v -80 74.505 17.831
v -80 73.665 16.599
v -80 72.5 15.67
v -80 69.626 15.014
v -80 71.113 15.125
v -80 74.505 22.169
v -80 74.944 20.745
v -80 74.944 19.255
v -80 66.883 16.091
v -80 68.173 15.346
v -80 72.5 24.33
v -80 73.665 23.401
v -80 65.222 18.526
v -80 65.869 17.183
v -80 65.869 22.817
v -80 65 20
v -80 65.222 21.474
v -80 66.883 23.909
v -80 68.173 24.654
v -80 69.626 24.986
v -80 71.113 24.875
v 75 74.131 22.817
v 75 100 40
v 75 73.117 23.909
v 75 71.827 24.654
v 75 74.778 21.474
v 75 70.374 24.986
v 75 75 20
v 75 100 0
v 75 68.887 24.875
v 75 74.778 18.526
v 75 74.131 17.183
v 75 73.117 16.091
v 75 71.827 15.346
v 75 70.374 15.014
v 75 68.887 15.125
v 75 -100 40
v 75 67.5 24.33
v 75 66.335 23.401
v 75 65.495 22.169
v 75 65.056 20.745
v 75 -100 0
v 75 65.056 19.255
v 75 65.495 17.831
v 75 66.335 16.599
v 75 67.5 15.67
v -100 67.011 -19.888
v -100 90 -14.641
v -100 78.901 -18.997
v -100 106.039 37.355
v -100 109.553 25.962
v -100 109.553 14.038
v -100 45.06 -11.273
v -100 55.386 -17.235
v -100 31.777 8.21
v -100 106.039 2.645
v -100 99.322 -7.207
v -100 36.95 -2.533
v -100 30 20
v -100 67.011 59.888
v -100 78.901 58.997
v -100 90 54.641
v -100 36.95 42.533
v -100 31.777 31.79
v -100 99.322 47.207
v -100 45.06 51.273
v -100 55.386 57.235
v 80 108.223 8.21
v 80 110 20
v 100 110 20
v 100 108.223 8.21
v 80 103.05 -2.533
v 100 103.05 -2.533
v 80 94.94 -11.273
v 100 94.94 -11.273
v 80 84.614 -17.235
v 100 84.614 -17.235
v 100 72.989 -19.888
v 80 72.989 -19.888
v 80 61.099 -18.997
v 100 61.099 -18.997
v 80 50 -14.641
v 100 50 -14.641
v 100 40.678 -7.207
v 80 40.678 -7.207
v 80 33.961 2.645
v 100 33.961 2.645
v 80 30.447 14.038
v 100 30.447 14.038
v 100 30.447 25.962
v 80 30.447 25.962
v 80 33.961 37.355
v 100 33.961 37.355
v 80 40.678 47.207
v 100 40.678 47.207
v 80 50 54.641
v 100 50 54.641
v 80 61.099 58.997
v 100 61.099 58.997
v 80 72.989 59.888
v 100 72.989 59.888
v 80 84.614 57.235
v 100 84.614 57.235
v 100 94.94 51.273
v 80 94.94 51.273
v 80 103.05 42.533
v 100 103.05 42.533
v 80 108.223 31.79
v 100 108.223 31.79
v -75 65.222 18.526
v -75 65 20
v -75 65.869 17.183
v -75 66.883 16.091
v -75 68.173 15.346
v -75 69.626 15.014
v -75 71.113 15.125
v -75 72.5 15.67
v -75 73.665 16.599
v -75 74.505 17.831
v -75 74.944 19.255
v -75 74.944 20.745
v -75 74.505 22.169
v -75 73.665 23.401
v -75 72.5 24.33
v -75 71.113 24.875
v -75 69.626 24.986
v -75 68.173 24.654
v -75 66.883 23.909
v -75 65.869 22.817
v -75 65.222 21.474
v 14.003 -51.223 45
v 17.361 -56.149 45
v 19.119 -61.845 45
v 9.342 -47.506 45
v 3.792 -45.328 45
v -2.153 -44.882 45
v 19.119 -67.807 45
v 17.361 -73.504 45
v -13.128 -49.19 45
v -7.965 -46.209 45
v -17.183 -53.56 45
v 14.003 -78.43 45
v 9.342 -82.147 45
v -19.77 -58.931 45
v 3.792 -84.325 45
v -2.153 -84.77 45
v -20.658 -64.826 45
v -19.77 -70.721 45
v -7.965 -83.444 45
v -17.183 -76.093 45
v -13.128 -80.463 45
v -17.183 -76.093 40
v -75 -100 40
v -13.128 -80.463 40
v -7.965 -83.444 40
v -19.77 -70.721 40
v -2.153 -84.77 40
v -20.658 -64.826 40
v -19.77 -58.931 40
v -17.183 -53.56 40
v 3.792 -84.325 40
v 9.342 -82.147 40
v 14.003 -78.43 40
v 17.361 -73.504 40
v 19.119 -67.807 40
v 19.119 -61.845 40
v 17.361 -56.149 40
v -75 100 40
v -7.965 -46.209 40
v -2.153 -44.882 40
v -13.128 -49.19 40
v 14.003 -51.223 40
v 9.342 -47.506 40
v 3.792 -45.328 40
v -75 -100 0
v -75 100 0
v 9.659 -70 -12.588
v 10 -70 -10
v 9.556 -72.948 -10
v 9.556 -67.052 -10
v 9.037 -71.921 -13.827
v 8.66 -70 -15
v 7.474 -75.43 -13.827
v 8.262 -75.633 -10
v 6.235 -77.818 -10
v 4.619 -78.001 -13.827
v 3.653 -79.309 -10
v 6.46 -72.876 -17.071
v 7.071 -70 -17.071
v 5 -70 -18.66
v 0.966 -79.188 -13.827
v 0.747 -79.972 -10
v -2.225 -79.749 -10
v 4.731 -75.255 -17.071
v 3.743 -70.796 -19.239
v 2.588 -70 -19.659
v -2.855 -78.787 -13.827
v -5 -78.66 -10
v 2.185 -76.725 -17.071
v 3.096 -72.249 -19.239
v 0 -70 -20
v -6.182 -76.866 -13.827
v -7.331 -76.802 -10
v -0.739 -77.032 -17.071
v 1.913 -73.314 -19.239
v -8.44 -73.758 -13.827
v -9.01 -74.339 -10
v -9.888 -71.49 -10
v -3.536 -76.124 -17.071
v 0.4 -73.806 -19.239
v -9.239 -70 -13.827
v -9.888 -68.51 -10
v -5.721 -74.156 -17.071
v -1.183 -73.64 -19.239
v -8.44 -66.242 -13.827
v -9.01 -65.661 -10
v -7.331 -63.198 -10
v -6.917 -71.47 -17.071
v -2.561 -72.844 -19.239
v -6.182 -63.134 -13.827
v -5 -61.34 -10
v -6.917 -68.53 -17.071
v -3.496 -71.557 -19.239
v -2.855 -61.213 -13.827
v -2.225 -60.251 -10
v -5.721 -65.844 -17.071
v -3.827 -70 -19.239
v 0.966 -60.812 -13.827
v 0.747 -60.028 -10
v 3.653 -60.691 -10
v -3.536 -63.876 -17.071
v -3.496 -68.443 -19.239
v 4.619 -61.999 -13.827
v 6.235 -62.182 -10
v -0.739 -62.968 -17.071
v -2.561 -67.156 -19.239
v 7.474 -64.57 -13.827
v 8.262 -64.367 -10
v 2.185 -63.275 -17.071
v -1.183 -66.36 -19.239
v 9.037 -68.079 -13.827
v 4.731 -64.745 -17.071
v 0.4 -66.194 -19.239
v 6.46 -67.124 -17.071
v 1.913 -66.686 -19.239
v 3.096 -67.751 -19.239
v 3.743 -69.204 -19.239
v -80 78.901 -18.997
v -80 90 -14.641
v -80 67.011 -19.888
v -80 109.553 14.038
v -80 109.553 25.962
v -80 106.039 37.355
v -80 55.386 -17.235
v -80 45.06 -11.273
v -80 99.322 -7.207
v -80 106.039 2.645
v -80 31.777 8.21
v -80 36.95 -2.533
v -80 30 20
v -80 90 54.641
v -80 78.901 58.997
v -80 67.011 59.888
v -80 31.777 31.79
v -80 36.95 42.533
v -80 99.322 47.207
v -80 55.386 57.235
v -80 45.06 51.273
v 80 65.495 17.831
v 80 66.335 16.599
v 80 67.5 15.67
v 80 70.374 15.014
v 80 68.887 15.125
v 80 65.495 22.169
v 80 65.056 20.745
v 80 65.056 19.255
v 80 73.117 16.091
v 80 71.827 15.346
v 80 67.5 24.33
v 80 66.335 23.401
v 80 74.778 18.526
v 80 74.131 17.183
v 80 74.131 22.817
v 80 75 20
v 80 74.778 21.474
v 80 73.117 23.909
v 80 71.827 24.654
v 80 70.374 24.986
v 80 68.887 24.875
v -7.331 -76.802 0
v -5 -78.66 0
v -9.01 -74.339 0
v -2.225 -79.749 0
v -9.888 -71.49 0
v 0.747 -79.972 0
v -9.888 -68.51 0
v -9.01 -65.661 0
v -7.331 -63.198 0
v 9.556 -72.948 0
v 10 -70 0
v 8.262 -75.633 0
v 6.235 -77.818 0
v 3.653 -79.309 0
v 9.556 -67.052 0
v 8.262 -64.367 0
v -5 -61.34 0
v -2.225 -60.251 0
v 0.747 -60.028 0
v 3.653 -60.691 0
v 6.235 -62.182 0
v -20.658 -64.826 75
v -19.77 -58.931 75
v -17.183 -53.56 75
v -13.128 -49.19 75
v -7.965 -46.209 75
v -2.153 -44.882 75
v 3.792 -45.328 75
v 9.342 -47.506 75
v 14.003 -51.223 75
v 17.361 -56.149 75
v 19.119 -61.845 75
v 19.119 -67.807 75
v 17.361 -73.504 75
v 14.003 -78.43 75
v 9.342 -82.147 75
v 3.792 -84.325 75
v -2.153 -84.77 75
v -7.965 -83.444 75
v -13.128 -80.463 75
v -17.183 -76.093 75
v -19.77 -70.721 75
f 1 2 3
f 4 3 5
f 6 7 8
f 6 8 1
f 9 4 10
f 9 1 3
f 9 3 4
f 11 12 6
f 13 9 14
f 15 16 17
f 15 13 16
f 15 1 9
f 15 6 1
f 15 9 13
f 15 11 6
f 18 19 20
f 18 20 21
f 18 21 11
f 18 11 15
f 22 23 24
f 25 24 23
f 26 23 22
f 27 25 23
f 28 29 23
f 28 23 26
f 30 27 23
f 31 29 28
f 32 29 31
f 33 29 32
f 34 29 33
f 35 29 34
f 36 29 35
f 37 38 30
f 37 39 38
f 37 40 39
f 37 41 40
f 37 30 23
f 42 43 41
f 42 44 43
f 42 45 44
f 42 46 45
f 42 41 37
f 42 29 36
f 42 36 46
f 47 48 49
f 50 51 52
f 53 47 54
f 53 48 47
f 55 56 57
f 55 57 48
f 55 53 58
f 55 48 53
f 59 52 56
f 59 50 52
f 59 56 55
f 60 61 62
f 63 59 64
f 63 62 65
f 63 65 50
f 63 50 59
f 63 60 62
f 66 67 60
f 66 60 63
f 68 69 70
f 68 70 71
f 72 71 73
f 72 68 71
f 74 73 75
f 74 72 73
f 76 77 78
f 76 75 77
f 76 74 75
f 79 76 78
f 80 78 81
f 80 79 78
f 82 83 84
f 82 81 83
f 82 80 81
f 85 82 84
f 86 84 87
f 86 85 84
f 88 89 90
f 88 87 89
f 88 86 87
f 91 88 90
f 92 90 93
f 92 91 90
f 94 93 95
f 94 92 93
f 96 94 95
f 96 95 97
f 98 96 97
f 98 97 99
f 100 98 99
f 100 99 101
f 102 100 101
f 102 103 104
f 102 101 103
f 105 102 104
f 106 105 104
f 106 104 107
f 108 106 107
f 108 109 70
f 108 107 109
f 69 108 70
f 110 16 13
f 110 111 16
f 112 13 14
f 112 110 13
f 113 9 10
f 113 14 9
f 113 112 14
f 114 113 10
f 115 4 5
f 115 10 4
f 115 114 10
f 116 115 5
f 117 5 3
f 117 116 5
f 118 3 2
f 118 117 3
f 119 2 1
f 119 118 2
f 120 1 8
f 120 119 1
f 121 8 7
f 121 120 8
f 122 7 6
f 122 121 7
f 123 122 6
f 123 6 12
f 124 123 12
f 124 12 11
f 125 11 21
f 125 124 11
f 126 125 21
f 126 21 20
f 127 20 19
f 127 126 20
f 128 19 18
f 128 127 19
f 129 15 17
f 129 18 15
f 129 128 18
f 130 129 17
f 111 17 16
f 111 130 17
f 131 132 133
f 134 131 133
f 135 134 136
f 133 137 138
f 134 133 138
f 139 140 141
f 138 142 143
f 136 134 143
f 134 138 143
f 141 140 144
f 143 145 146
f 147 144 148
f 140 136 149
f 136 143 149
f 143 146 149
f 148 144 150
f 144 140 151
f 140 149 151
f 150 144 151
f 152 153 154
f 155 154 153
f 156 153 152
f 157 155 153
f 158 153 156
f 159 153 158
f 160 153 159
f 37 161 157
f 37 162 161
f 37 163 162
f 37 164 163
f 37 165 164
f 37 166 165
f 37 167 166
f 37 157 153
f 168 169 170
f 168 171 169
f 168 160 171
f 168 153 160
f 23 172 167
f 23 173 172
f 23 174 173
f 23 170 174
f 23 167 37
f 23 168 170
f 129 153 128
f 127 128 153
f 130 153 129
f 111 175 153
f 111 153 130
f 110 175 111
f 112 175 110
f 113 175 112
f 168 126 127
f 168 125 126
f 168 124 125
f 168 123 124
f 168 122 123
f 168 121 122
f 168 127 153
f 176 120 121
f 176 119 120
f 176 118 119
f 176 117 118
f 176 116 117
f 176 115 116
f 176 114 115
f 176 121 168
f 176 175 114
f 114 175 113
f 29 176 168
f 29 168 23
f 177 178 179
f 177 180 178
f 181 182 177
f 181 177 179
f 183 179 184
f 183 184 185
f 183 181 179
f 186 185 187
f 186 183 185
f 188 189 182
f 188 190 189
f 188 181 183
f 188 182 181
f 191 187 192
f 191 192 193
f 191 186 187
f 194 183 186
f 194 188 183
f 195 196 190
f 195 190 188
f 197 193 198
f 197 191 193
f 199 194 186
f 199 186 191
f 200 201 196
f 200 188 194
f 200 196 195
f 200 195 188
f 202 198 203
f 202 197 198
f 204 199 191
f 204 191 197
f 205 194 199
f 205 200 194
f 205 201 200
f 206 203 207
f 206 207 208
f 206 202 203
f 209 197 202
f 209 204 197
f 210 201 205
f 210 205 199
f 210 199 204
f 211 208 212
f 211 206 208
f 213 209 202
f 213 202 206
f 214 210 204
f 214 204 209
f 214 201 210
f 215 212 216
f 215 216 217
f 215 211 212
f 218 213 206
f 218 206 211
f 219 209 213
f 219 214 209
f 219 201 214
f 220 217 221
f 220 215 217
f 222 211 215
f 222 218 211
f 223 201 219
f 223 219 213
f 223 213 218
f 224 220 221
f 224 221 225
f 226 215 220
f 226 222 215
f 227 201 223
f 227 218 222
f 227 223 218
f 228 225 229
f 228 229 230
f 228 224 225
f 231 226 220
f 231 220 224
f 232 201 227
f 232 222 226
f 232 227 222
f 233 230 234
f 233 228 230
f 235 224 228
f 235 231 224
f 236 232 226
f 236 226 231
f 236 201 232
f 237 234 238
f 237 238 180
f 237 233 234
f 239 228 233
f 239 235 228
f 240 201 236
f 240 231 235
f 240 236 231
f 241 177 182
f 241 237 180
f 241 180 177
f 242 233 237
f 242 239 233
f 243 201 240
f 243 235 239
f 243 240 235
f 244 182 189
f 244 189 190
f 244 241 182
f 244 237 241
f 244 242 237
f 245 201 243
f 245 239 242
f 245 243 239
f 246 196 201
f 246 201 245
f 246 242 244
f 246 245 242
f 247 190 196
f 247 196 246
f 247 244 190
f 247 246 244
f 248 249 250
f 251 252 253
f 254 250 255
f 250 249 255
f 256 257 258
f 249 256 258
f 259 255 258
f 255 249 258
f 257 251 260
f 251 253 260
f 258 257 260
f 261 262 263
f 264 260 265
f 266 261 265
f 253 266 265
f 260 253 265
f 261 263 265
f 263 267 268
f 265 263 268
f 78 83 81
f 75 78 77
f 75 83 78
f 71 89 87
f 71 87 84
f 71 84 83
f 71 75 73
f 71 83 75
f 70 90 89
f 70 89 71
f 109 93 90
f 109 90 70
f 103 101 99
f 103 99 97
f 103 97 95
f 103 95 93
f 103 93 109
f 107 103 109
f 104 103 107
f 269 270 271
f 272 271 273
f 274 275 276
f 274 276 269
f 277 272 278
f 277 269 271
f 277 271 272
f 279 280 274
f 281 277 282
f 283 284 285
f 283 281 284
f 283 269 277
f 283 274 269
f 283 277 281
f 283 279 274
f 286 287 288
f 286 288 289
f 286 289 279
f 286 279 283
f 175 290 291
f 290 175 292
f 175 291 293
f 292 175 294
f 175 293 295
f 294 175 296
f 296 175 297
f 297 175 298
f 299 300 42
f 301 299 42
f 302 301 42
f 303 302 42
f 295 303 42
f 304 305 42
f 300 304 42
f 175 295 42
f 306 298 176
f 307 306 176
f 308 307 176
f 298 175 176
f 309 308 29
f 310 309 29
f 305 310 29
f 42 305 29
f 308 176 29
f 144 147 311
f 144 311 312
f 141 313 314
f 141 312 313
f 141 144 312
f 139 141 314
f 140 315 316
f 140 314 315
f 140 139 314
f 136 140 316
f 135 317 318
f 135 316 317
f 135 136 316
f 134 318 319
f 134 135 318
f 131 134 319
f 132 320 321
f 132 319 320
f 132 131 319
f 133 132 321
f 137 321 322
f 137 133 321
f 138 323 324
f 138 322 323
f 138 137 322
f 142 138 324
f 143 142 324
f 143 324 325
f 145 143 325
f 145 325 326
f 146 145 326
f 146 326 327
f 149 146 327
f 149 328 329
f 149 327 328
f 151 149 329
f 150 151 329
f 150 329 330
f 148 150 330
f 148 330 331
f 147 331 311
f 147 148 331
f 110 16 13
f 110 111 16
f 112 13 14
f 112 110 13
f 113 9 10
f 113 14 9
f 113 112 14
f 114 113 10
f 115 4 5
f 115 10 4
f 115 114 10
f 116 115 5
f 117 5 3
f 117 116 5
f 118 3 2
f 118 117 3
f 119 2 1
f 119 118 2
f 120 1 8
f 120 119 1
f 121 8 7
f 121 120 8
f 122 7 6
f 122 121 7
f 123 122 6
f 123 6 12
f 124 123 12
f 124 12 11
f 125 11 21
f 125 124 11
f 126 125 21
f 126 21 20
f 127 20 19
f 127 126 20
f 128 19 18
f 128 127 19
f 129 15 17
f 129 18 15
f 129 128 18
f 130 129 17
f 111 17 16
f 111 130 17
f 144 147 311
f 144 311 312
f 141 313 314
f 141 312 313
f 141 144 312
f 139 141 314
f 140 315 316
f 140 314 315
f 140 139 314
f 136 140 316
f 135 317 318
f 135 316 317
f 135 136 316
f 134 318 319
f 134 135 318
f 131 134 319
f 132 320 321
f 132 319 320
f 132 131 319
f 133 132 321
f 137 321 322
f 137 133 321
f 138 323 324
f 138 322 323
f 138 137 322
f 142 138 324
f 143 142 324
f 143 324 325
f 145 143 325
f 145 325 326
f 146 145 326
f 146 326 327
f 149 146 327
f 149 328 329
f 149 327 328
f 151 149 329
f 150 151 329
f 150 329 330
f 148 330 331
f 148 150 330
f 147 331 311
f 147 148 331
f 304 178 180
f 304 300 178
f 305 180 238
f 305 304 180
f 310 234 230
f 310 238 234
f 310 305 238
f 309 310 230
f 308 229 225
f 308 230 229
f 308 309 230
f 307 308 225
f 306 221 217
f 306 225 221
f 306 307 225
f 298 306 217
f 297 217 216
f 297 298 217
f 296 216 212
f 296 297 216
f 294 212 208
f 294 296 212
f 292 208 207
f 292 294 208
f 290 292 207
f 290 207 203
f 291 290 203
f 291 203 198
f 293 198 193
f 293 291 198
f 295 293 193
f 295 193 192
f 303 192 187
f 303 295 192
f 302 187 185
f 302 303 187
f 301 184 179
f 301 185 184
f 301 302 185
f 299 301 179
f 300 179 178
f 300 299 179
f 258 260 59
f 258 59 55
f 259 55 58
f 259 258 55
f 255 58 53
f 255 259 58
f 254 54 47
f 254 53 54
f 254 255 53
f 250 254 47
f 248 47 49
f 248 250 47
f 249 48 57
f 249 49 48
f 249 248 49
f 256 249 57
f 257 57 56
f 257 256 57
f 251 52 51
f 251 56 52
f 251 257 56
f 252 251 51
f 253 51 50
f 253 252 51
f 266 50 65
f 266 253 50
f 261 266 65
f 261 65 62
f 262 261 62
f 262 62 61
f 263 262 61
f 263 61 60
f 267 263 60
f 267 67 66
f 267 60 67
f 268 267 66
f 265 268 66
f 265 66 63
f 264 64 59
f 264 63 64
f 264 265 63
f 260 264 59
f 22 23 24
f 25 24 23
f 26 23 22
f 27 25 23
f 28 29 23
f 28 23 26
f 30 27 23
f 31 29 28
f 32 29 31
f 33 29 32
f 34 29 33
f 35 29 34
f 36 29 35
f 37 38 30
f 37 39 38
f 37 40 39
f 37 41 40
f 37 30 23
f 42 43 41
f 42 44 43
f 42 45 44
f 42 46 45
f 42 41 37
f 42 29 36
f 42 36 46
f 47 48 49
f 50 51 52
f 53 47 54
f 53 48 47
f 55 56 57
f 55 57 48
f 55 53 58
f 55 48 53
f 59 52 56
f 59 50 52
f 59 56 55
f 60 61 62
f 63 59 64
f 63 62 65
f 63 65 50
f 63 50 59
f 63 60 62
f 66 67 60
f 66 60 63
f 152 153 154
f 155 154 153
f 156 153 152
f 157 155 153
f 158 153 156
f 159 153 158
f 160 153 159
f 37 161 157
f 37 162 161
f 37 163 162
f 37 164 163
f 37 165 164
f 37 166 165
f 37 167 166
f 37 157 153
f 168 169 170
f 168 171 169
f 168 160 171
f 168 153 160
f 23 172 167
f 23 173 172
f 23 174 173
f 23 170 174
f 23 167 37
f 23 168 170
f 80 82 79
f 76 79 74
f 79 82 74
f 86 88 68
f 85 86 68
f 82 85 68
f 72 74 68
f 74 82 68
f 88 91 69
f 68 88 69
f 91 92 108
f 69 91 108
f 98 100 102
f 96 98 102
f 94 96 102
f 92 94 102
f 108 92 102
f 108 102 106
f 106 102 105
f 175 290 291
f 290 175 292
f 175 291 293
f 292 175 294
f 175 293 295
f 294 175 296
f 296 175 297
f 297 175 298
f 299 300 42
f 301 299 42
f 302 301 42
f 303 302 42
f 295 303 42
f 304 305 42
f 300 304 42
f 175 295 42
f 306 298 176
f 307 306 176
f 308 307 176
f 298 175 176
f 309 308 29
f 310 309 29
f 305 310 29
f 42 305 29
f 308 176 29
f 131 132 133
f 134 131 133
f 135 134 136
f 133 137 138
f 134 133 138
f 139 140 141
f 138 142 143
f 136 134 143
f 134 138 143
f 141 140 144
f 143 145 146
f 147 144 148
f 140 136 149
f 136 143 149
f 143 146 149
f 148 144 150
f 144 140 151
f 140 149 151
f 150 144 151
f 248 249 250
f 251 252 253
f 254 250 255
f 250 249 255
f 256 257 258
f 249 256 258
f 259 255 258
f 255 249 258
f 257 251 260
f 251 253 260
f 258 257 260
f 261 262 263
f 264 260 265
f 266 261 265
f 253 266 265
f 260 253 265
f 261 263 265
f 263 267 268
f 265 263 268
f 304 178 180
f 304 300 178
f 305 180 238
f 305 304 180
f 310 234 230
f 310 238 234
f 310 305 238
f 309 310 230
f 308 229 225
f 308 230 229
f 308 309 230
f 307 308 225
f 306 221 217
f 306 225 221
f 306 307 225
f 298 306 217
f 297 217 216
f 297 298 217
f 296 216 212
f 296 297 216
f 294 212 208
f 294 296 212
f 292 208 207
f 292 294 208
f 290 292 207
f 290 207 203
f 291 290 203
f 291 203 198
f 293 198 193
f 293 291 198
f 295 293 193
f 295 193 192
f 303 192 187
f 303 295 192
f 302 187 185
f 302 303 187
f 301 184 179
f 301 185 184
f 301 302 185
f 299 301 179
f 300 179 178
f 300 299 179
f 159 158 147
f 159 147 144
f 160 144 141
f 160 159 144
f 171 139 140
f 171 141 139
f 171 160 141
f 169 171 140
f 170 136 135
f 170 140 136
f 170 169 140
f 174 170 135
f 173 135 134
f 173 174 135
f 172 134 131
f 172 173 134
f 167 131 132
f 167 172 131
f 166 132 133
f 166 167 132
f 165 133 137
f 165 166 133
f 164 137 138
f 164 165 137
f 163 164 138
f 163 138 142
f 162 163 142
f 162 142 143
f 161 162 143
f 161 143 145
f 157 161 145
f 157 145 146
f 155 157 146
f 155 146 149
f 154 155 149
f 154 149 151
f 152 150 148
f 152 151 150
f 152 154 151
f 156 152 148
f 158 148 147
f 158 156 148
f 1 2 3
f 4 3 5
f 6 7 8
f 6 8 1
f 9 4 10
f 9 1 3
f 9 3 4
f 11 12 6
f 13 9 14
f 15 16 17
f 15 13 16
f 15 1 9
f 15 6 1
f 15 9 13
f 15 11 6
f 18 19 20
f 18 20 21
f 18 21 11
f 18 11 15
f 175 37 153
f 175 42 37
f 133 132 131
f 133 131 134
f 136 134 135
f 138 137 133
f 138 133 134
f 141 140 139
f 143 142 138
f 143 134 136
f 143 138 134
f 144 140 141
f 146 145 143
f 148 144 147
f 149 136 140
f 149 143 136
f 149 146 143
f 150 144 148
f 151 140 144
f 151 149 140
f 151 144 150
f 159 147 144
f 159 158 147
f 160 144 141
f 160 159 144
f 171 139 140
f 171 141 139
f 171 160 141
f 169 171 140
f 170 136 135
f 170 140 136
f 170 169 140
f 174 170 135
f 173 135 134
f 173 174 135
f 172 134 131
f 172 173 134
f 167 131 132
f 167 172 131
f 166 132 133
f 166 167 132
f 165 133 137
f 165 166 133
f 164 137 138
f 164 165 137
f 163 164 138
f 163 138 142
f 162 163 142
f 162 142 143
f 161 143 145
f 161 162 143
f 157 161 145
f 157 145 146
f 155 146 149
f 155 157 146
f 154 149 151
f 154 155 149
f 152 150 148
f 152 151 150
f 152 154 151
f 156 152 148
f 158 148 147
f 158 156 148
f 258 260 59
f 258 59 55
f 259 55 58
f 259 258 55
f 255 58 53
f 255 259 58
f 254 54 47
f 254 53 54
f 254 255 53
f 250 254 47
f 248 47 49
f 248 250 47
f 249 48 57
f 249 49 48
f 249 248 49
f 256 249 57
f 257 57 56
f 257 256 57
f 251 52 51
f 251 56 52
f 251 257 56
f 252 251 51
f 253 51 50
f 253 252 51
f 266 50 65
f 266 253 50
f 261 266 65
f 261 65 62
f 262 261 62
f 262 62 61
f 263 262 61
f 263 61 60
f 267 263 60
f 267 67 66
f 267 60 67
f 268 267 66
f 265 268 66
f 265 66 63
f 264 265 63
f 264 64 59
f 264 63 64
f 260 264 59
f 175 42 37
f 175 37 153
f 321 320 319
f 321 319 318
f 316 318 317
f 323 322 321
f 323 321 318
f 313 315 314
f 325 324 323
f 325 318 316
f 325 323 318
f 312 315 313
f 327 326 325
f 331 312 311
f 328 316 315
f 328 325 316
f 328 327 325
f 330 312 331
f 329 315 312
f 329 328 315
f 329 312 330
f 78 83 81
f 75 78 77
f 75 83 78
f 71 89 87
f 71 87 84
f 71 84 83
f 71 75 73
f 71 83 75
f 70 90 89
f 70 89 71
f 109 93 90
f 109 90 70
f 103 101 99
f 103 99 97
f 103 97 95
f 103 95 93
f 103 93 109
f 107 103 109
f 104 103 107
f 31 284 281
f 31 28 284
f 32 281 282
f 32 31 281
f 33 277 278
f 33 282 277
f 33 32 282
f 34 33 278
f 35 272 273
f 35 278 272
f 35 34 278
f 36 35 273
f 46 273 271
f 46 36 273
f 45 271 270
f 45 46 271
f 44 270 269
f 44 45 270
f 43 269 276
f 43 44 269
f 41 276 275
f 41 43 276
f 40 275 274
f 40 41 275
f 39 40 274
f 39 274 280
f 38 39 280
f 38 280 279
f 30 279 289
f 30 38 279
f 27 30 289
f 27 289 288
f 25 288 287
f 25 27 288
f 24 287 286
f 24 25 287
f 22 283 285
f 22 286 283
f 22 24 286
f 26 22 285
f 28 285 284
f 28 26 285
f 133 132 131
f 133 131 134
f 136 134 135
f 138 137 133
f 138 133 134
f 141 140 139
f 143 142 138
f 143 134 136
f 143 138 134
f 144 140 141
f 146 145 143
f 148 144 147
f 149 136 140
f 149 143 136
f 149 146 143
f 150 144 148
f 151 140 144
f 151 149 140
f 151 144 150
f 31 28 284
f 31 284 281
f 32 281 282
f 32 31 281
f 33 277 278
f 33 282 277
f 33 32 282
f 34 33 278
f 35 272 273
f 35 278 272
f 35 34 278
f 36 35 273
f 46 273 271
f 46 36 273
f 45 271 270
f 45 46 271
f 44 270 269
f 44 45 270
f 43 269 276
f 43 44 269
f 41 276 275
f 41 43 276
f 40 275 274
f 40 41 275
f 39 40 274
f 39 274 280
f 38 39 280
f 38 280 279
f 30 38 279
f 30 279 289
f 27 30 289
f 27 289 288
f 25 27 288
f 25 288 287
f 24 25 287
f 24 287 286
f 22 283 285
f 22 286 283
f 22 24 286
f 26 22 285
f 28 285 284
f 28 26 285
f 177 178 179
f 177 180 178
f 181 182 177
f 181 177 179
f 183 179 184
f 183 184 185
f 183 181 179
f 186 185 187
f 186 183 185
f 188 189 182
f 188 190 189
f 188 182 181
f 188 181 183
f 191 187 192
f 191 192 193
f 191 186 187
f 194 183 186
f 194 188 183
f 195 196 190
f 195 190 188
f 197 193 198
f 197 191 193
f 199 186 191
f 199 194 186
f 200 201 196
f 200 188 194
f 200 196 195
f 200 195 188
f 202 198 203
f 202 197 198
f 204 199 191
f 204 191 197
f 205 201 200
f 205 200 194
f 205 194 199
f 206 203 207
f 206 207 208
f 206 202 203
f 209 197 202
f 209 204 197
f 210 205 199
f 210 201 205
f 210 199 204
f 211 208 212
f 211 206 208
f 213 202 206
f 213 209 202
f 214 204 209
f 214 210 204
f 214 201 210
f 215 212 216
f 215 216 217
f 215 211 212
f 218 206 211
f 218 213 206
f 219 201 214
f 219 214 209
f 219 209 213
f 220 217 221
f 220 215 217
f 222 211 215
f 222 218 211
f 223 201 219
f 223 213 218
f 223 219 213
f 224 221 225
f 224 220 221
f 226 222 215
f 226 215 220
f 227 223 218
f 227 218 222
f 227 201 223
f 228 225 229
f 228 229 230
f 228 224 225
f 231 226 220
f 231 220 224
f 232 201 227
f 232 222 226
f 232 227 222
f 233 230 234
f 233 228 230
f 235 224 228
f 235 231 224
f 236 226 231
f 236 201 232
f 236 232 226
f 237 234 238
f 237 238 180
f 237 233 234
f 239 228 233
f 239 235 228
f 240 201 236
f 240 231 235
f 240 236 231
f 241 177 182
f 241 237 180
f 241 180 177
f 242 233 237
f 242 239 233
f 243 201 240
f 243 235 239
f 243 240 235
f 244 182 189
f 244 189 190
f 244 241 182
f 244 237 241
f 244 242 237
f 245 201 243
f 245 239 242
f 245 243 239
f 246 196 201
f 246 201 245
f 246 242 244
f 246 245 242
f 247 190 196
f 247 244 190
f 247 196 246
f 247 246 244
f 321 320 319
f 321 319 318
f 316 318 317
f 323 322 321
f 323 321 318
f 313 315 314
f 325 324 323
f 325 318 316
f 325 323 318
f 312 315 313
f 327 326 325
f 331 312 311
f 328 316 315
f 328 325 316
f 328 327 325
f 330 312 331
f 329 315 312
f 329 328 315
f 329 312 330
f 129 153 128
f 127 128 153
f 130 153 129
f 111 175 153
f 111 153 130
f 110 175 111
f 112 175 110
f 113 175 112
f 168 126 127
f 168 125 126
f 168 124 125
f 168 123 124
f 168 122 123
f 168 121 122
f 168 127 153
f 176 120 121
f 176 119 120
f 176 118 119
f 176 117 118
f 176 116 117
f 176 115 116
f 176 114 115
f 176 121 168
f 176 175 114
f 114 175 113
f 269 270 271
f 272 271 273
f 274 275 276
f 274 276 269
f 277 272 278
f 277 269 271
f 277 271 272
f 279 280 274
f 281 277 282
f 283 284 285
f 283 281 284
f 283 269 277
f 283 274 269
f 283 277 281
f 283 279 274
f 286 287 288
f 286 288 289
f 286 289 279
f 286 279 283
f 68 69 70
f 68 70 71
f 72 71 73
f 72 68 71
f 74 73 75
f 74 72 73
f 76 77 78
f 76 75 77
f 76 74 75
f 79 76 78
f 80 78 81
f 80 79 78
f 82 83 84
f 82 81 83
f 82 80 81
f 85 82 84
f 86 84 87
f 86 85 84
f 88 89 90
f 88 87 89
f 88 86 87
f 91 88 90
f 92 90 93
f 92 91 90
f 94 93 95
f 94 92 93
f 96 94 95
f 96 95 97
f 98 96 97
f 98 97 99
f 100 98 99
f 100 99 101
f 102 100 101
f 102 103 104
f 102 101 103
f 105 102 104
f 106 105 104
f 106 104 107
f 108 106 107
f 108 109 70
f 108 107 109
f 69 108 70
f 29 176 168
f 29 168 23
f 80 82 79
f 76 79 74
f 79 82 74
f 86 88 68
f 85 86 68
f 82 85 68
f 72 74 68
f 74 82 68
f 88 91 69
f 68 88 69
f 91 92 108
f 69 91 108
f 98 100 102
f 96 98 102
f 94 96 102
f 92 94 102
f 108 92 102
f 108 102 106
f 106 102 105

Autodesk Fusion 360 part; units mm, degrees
sketch "Sketch1" plane through (0, 0, 0) normal (0, 0, 1) x (1, 0, 0)
  line L0 (75, -100) -> (-75, -100)
  line L1 (-75, -100) -> (-75, 100)
  line L2 (-75, 100) -> (75, 100)
  line L3 (75, 100) -> (75, -100)
  line L4 (75, -100) -> (-75, 100) construction
  line L5 (-75, -100) -> (75, 100) construction
  dimension "d1" = 200
  dimension "d2" = 150
extrude "Extrude1" add sketch "Sketch1" along normal blind 40 makes body 1
sketch "Sketch2" plane through (75, 0, 0) normal (1, 0, 0) x (0, 1, 0)
  line L0 (-100, 0) -> (100, 0)
  line L1 (100, 0) -> (100, 40)
  line L2 (100, 40) -> (-100, 40)
  line L3 (-100, 40) -> (-100, 0)
  circle A0 centre (70, 20) radius 5
  dimension "d5" = 10
sketch "Sketch3" plane through (-75, 0, 0) normal (-1, 0, 0) x (0, -1, 0)
  line L0 (-100, 0) -> (100, 0)
  line L1 (100, 0) -> (100, 40)
  line L2 (100, 40) -> (-100, 40)
  line L3 (-100, 40) -> (-100, 0)
  circle A0 centre (-70, 20) radius 5
  dimension "d6" = 10
extrude "Extrude2" add sketch "Sketch2" along normal blind 5 contours A0 bodies 1
extrude "Extrude3" add sketch "Sketch3" along normal blind 5 contours A0 bodies 1
sketch "Sketch4" plane through (80, 0, 0) normal (1, 0, 0) x (0, 1, 0)
  circle A0 centre (70, 20) radius 5
sketch "Sketch5" plane through (80, 0, 0) normal (1, 0, 0) x (0, 1, 0)
  circle A0 centre (70, 20) radius 40
  dimension "d11" = 80
extrude "Extrude4" add sketch "Sketch5" sketch "Sketch4" along normal blind 20 separate body of sketch 2 makes body 2
sketch "Sketch6" plane through (-80, 0, 0) normal (-1, 0, 0) x (0, -1, 0)
  circle A0 centre (-70, 20) radius 5
  circle A1 centre (-70, 20) radius 40
  dimension "d14" = 80
extrude "Extrude5" add sketch "Sketch6" along normal blind 20 separate body contours A0 | A1 makes body 3
sketch "Sketch7" plane through (0, 0, 0) normal (0, 0, -1) x (1, 0, 0)
  line L0 (-75, -100) -> (75, -100)
  line L1 (75, -100) -> (75, 100)
  line L2 (75, 100) -> (-75, 100)
  line L3 (-75, 100) -> (-75, -100)
  circle A0 centre (0, 70) radius 10
  dimension "d17" = 20
extrude "Extrude6" add sketch "Sketch7" along normal blind 20 contours A0 bodies 1
fillet "Fillet1" radius 10 1 faces at (3.0744, -69.5032, -20) on bodies 1
sketch "Sketch8" plane through (0, 0, 40) normal (0, 0, 1) x (-1, 0, 0)
  line L0 (-75, -100) -> (75, -100)
  line L1 (75, -100) -> (75, 100)
  line L2 (75, 100) -> (-75, 100)
  line L3 (-75, 100) -> (-75, -100)
  circle A0 centre (0.6581, 64.8262) radius 20
  dimension "d22" = 40
extrude "Extrude7" add sketch "Sketch8" along normal blind 5 contours A0 bodies 1
extrude "Extrude8" add 1 faces at (-8.4731, -58.1782, 45) along direction (0, 0, 1) blind 30 separate body on bodies 1 makes body 4
copy_body "Body->Comp1" bodies 1 removing the originals makes body 5 in component "old_component"
copy_body "Body->Comp2" bodies 2 removing the originals makes body 6 in component "old_component (1)"
copy_body "Body->Comp3" bodies 3 removing the originals makes body 7 in component "old_component (2)"
copy_body "Body->Comp4" bodies 4 removing the originals makes body 8 in component "old_component (3)"
copy_body "CopyPasteBodies1" bodies 5 makes body 9 in component "base_link"
copy_body "CopyPasteBodies1'" bodies 6 makes body 10 in component "left_wheel_1"
copy_body "CopyPasteBodies1''" bodies 7 makes body 11 in component "right_wheel_1"
copy_body "CopyPasteBodies1'''" bodies 8 makes body 12 in component "lidar_1"
component "old_component" placed x (1, 0, 0) y (0, 1, 0) z (0, 0, 1) at (0, 0, 0)
component "old_component (1)" placed x (1, 0, 0) y (0, 1, 0) z (0, 0, 1) at (0, 0, 0)
component "old_component (2)" placed x (1, 0, 0) y (0, 1, 0) z (0, 0, 1) at (0, 0, 0)
component "old_component (3)" placed x (1, 0, 0) y (0, 1, 0) z (0, 0, 1) at (0, 0, 0)
component "base_link" placed x (1, 0, 0) y (0, 1, 0) z (0, 0, 1) at (0, 0, 0)
component "left_wheel_1" placed x (1, 0, 0) y (0, 1, 0) z (0, 0, 1) at (0, 0, 0)
component "right_wheel_1" placed x (1, 0, 0) y (0, 1, 0) z (0, 0, 1) at (0, 0, 0)
component "lidar_1" placed x (1, 0, 0) y (0, 1, 0) z (0, 0, 1) at (0, 0, 0)
